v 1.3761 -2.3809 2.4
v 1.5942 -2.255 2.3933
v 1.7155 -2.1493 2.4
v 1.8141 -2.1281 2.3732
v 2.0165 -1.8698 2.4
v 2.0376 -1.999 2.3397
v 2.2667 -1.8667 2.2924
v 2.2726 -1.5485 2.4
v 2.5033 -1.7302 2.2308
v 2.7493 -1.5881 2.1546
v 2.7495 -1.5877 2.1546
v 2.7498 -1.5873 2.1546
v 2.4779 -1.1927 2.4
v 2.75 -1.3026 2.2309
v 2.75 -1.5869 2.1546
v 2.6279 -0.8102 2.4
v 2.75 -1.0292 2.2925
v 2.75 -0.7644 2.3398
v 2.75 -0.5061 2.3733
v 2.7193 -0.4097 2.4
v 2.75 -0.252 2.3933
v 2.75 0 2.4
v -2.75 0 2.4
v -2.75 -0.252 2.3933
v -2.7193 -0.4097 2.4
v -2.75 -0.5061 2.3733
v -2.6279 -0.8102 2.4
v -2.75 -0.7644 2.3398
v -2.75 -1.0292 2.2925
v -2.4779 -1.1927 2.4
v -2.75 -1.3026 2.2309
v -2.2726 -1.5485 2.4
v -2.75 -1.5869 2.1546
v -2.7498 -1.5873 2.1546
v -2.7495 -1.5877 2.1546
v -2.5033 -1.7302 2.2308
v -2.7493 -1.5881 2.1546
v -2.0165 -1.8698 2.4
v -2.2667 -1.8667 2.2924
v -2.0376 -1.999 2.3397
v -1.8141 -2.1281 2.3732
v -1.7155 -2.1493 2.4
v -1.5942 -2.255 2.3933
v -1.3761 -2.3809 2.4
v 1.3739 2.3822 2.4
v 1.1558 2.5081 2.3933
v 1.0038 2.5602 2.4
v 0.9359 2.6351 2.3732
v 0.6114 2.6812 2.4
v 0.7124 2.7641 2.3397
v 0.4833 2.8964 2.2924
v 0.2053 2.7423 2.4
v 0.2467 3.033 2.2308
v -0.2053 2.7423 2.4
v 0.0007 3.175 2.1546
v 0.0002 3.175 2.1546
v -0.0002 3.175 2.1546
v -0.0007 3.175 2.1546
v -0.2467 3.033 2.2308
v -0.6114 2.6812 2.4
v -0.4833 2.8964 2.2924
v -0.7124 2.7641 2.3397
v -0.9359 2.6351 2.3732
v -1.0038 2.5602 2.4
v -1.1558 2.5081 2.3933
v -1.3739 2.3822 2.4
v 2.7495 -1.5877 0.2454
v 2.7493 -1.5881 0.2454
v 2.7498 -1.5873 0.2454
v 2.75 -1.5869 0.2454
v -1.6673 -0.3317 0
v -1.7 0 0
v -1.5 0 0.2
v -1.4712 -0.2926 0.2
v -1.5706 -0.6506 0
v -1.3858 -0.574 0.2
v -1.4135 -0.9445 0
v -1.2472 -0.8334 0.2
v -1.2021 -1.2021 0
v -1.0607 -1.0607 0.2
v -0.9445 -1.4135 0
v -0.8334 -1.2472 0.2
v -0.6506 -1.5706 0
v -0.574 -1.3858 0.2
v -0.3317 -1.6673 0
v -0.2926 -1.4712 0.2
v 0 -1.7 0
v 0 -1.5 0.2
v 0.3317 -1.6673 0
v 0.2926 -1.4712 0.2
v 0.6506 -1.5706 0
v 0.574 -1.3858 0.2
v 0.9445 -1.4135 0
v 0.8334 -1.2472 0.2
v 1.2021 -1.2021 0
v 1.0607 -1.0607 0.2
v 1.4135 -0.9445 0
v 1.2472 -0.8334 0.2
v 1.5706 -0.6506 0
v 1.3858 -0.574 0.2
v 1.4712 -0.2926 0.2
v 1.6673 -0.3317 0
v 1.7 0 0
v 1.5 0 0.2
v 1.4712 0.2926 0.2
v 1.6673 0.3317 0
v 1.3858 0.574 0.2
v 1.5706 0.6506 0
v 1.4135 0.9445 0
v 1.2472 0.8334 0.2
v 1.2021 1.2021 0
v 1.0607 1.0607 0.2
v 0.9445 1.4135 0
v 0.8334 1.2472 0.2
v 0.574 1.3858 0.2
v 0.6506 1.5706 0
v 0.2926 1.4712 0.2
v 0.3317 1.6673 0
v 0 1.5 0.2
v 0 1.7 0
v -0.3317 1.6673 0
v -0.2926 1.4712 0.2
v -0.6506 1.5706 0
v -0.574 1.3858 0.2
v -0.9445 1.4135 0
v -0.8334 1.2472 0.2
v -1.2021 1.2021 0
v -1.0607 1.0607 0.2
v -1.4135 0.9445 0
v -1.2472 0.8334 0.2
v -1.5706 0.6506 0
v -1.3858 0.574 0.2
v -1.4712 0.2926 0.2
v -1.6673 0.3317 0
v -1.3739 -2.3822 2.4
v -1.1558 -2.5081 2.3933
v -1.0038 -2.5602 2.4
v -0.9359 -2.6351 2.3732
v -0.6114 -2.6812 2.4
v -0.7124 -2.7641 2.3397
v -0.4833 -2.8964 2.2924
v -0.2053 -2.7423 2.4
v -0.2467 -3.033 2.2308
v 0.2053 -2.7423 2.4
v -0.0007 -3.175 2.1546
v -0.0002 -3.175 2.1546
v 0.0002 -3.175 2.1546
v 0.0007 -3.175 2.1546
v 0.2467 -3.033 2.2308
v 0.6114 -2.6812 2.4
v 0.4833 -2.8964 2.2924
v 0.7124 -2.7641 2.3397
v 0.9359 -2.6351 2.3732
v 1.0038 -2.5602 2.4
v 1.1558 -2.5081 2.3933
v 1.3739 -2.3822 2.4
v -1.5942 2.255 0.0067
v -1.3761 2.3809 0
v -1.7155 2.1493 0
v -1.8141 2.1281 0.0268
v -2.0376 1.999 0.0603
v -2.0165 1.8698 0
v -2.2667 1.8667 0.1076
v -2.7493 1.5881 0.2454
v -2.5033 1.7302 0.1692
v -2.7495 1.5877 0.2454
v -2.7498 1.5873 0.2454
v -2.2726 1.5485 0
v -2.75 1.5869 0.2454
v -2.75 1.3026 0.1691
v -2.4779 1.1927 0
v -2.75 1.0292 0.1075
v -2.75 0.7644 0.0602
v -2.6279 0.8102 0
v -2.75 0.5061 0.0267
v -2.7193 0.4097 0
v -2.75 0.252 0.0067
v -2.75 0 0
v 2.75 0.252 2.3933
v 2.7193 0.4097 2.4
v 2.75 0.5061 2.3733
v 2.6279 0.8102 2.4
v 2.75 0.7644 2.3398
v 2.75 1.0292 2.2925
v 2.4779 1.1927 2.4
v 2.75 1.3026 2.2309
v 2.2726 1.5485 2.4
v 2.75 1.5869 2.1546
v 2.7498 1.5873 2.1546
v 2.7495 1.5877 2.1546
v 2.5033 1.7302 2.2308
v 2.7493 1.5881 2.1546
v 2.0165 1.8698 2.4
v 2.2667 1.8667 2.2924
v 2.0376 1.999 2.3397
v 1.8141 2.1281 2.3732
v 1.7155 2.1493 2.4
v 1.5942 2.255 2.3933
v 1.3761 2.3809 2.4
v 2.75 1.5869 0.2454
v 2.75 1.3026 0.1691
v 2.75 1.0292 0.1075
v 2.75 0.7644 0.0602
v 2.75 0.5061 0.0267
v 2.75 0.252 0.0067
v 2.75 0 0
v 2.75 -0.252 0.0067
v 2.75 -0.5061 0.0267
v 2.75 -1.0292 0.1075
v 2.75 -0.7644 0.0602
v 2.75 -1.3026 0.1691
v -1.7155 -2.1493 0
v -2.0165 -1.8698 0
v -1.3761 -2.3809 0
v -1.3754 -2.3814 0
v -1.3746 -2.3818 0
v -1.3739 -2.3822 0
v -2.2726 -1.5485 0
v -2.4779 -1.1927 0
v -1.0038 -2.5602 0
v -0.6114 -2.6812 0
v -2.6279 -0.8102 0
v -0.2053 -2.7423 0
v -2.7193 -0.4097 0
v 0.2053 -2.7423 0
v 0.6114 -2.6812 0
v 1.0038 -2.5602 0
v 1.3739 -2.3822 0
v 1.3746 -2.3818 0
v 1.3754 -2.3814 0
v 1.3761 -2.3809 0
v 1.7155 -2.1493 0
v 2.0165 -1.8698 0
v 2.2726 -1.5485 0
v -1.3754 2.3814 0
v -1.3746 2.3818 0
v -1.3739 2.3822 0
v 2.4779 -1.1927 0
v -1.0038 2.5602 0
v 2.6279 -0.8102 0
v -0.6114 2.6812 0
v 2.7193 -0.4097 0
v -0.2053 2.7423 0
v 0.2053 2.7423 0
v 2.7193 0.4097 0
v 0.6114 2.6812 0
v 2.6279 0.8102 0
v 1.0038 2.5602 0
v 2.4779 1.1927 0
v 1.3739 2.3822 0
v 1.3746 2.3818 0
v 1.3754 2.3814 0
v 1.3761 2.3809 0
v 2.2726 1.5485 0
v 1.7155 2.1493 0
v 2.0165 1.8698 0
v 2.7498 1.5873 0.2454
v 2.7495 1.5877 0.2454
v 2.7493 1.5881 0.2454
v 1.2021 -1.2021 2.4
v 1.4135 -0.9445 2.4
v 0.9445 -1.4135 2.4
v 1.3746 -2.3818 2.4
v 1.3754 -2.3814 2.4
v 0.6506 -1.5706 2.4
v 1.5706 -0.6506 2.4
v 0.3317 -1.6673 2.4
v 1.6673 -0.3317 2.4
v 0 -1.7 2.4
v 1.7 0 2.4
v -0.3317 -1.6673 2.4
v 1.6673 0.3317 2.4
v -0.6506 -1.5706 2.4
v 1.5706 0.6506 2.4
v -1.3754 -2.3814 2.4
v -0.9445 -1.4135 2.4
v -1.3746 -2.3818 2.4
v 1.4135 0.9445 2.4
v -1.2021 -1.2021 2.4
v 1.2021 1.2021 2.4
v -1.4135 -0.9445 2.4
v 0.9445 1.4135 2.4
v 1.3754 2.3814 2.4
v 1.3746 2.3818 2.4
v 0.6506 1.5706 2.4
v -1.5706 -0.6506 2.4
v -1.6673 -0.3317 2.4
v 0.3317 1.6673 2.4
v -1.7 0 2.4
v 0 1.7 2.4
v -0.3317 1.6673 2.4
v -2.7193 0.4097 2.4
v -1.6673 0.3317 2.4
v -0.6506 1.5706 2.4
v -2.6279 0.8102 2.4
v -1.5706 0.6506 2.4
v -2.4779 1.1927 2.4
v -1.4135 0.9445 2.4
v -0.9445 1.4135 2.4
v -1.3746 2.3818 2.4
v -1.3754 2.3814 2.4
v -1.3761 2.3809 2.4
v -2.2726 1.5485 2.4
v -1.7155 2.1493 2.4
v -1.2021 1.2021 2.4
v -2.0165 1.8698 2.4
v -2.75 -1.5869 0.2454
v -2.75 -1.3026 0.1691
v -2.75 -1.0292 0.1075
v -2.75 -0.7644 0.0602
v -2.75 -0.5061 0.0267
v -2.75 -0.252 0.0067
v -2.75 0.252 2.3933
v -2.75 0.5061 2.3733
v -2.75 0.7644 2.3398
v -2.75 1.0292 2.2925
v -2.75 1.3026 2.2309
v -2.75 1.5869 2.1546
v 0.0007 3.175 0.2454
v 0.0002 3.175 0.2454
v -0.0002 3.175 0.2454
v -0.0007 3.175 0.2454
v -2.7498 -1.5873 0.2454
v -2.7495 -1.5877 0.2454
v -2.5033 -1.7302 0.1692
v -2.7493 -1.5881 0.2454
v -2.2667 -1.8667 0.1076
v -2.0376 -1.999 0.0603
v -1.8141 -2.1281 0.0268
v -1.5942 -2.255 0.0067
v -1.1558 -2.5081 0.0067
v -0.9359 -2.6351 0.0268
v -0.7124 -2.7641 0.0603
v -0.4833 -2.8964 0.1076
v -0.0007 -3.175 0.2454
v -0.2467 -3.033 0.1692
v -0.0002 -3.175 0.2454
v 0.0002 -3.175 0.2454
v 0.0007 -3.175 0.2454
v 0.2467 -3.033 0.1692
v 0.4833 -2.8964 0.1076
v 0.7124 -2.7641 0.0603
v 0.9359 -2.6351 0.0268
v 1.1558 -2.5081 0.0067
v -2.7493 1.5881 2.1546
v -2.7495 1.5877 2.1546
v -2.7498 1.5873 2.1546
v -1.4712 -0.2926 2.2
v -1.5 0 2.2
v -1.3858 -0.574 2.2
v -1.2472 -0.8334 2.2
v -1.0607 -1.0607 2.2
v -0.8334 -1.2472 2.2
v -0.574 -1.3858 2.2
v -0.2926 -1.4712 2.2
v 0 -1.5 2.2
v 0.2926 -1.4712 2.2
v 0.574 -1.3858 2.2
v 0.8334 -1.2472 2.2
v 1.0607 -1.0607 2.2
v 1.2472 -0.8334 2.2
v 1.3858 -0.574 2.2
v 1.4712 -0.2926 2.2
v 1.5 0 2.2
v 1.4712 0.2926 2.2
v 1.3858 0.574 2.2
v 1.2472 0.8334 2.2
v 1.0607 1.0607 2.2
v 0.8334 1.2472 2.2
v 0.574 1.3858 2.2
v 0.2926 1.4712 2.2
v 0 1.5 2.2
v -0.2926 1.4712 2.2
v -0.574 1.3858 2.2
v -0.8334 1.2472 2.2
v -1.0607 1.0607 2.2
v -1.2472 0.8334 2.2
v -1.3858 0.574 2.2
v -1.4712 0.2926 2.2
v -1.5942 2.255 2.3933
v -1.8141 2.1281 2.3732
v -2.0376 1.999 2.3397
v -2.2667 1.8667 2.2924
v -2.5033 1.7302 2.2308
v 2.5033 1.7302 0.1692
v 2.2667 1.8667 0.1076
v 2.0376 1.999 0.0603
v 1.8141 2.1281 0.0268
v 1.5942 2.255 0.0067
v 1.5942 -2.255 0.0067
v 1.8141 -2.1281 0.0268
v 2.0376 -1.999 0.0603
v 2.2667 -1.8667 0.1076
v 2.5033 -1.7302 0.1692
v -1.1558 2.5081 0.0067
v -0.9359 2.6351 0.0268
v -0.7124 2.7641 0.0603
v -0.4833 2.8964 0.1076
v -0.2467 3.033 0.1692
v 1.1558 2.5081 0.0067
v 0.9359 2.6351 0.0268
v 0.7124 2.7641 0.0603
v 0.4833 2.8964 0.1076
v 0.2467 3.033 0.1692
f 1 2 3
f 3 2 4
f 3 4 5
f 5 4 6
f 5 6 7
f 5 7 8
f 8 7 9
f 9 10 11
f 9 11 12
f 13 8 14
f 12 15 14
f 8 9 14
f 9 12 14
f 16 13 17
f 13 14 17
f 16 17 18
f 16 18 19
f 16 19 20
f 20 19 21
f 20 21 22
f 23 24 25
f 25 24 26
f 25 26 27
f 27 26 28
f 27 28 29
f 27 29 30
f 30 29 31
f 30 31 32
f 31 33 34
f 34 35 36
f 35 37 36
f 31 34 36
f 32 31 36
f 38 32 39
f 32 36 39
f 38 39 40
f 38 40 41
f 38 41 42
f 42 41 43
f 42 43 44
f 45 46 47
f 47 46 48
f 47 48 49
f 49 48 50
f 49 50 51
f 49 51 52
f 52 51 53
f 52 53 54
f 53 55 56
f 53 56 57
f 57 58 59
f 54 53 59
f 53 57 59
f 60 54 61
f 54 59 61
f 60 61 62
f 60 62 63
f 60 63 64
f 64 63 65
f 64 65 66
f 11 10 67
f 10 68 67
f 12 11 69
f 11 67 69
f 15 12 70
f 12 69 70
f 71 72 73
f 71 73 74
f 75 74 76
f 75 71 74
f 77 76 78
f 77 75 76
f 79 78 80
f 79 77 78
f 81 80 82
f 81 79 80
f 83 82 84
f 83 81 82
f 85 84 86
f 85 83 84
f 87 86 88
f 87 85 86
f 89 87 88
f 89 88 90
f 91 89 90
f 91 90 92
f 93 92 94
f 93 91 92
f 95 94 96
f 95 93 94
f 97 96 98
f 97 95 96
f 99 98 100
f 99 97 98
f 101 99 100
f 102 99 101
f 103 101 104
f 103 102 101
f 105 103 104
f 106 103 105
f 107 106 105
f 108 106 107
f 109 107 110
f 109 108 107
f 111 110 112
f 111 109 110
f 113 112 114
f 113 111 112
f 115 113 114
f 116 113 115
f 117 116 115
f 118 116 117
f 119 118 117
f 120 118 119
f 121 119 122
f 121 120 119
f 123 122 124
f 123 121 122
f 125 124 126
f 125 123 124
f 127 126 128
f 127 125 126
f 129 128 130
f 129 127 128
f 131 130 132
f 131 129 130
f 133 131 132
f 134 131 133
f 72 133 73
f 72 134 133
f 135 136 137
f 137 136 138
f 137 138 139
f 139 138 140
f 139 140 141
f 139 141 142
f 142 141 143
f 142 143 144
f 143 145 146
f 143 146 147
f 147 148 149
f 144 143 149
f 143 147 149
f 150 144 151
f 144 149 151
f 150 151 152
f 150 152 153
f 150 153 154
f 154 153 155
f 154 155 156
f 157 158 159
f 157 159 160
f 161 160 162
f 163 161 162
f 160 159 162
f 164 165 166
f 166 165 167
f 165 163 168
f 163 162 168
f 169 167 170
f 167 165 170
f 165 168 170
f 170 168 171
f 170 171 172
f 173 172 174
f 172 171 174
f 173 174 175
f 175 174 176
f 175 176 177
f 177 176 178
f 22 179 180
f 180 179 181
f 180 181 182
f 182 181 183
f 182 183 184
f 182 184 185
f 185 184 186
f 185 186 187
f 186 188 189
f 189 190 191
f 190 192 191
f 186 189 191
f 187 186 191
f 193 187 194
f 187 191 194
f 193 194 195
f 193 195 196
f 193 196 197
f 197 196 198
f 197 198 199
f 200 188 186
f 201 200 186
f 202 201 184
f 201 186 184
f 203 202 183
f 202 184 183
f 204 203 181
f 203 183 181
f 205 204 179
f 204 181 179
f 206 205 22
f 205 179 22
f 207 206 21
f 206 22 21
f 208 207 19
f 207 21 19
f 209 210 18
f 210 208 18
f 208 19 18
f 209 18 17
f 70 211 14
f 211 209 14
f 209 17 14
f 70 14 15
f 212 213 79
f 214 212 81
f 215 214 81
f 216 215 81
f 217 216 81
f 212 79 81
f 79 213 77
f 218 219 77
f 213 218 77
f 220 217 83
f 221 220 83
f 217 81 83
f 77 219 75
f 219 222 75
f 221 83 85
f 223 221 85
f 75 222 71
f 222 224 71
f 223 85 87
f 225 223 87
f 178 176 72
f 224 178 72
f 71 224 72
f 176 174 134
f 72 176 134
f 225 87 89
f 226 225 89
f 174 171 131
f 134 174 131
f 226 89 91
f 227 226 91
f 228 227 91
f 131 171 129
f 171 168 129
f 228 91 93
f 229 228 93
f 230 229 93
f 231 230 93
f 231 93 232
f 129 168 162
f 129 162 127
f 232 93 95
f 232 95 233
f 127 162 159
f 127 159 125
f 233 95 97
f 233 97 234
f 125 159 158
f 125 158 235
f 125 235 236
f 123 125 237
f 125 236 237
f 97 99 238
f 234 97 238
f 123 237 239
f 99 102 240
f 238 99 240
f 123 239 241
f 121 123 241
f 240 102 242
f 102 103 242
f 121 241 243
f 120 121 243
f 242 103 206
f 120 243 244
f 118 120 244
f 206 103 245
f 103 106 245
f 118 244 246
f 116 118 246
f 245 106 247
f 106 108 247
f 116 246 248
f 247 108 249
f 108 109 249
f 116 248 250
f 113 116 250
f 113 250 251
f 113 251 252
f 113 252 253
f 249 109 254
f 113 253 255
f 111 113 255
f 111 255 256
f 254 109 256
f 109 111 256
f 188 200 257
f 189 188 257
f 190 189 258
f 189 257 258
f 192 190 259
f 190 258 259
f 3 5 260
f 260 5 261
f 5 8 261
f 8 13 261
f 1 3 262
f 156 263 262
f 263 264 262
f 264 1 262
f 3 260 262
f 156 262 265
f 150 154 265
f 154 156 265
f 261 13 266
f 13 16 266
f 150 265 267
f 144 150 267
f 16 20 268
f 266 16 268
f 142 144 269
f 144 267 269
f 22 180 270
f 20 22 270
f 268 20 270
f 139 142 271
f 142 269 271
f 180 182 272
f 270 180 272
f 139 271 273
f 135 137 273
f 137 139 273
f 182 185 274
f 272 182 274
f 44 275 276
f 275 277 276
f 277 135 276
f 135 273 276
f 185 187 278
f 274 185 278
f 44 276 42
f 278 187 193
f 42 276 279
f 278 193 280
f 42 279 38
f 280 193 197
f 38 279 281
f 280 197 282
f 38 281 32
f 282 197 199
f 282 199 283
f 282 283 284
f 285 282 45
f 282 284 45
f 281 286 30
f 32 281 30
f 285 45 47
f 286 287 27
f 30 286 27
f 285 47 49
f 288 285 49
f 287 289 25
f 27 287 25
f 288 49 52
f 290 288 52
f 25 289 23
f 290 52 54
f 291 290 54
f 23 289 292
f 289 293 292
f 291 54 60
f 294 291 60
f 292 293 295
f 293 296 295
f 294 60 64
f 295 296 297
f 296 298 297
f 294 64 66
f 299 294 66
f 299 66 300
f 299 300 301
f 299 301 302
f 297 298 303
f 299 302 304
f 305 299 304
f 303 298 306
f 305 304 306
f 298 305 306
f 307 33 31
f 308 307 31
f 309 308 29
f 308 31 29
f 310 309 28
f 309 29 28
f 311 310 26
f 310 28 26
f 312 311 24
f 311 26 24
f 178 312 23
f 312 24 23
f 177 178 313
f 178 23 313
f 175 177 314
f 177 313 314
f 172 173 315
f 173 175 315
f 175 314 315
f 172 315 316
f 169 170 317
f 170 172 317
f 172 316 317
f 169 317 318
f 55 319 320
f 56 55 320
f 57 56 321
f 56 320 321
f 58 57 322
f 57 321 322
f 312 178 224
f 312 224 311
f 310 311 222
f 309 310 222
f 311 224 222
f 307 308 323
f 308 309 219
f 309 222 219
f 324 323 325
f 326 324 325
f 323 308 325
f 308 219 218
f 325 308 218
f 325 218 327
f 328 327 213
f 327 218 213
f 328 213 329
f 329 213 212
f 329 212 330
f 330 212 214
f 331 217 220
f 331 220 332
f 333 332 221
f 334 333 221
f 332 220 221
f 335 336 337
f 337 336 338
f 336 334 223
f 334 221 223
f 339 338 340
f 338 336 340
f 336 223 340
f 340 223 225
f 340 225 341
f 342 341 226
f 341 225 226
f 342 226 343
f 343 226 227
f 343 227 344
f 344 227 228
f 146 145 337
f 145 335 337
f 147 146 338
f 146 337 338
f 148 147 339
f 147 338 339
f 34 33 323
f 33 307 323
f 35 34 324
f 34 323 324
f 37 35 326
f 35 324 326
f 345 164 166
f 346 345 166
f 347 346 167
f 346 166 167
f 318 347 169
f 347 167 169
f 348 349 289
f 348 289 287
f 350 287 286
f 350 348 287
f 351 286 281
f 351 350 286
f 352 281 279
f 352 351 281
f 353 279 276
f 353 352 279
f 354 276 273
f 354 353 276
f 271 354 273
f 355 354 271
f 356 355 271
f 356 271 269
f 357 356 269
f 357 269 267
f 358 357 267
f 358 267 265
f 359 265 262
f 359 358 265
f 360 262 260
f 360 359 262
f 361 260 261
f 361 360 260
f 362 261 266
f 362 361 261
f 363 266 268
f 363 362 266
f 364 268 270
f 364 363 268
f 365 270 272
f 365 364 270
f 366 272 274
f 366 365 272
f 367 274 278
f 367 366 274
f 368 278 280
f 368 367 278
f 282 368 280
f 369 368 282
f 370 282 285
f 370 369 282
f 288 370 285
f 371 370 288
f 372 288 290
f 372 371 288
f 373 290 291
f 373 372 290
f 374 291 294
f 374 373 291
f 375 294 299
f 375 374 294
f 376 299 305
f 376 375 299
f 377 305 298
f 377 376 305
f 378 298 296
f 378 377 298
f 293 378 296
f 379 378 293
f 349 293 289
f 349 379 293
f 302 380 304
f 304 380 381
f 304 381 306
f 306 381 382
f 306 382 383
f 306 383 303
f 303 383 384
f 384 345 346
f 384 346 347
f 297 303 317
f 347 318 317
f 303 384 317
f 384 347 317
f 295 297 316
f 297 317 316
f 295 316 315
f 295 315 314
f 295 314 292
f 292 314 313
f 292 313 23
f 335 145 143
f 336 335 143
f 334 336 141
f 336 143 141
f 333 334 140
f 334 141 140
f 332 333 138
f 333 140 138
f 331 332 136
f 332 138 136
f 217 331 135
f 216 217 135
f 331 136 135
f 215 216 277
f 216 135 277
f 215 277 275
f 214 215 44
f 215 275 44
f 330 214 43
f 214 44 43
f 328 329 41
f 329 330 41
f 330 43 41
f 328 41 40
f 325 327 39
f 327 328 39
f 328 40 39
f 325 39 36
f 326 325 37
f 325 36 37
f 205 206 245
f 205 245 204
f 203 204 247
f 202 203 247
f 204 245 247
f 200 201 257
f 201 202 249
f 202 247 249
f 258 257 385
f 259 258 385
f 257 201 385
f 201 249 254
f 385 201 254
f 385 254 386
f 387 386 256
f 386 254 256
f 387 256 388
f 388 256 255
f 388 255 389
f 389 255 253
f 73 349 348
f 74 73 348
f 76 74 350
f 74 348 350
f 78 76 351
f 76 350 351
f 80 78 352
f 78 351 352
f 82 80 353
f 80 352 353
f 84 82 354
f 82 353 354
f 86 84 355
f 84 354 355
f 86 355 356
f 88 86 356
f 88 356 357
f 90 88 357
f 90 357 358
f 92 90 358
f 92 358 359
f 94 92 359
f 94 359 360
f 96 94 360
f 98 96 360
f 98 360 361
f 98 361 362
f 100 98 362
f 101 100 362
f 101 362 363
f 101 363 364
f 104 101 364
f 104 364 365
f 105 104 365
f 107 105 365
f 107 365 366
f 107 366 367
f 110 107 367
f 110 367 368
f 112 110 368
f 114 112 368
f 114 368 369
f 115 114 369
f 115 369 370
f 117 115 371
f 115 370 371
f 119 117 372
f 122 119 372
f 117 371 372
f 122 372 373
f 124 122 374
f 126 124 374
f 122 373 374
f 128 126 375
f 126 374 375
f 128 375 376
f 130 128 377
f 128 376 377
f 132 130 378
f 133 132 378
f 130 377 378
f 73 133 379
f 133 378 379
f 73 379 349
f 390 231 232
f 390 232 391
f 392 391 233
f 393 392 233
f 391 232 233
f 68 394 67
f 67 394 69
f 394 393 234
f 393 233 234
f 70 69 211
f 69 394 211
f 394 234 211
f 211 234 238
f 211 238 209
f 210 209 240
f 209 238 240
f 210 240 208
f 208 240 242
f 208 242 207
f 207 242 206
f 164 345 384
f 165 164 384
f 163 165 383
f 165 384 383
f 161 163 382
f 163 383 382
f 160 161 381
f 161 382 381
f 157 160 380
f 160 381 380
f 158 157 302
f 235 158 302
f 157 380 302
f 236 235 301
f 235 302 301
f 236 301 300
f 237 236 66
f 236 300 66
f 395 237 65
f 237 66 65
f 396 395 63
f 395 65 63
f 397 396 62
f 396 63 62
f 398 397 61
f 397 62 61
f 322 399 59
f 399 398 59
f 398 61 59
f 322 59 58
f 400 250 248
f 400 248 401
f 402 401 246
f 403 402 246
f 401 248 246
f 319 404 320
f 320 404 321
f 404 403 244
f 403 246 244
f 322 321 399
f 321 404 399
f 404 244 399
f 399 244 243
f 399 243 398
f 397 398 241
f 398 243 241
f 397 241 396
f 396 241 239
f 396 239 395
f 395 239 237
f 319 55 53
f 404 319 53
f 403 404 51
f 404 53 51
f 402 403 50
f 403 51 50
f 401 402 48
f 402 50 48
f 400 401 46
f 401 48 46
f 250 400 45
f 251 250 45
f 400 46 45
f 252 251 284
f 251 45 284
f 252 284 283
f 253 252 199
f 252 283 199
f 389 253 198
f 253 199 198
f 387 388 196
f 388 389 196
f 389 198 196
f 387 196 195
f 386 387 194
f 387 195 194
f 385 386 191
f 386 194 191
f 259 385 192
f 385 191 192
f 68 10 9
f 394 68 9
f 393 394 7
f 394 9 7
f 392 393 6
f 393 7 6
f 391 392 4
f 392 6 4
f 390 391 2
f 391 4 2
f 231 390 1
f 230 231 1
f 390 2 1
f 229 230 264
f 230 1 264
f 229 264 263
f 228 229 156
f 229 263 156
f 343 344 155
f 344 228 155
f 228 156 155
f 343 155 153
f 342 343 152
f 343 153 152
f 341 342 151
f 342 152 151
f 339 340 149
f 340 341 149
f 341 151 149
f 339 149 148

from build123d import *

# Parameters (mm, degrees)
SKETCH018_R     = 4.175426
POCKET007_DEPTH = 2.401
SKETCH017_R     = 1.5
POCKET008_DEPTH = 2.401
CHAMFER008_SIZE = 0.2


with BuildPart() as part:
    # Sketch013 → Revolution008 (revolve)
    with BuildSketch(Plane.XZ):
        Polygon((0, 2.4), (2.75, 2.4), (3.175, 2.154626), (3.175, 0.245374), (2.75, 0), (0, 0), align=None)
    revolve(axis=Axis((0, 0, 0), (0, 0, 1)))

    # Sketch018 (on Face3 of Revolution008) → Pocket007 (cut, through all)
    with BuildSketch(Plane(origin=(0, 0, 2.4), x_dir=(-1, 0, 0), z_dir=(0, 0, 1))):
        Circle(SKETCH018_R)
        Polygon((-2.75, 1.587713), (0, 3.175426), (2.75, 1.587713), (2.75, -1.587713), (0, -3.175426), (-2.75, -1.587713), align=None, mode=Mode.SUBTRACT)
    extrude(amount=-POCKET007_DEPTH, mode=Mode.SUBTRACT)

    # Sketch017 (on Face16 of Pocket007) → Pocket008 (cut, through all)
    with BuildSketch(Plane(origin=(0, 0, 2.4), x_dir=(-1, 0, 0), z_dir=(0, 0, 1))):
        Circle(SKETCH017_R)
    extrude(amount=-POCKET008_DEPTH, mode=Mode.SUBTRACT)

    # Chamfer008
    chamfer008_edges = [part.edges().sort_by_distance(p)[0] for p in [
        (1.5, 0, 2.4),
        (1.5, 0, 0),
    ]]
    chamfer(chamfer008_edges, length=CHAMFER008_SIZE)


solid = part.part
